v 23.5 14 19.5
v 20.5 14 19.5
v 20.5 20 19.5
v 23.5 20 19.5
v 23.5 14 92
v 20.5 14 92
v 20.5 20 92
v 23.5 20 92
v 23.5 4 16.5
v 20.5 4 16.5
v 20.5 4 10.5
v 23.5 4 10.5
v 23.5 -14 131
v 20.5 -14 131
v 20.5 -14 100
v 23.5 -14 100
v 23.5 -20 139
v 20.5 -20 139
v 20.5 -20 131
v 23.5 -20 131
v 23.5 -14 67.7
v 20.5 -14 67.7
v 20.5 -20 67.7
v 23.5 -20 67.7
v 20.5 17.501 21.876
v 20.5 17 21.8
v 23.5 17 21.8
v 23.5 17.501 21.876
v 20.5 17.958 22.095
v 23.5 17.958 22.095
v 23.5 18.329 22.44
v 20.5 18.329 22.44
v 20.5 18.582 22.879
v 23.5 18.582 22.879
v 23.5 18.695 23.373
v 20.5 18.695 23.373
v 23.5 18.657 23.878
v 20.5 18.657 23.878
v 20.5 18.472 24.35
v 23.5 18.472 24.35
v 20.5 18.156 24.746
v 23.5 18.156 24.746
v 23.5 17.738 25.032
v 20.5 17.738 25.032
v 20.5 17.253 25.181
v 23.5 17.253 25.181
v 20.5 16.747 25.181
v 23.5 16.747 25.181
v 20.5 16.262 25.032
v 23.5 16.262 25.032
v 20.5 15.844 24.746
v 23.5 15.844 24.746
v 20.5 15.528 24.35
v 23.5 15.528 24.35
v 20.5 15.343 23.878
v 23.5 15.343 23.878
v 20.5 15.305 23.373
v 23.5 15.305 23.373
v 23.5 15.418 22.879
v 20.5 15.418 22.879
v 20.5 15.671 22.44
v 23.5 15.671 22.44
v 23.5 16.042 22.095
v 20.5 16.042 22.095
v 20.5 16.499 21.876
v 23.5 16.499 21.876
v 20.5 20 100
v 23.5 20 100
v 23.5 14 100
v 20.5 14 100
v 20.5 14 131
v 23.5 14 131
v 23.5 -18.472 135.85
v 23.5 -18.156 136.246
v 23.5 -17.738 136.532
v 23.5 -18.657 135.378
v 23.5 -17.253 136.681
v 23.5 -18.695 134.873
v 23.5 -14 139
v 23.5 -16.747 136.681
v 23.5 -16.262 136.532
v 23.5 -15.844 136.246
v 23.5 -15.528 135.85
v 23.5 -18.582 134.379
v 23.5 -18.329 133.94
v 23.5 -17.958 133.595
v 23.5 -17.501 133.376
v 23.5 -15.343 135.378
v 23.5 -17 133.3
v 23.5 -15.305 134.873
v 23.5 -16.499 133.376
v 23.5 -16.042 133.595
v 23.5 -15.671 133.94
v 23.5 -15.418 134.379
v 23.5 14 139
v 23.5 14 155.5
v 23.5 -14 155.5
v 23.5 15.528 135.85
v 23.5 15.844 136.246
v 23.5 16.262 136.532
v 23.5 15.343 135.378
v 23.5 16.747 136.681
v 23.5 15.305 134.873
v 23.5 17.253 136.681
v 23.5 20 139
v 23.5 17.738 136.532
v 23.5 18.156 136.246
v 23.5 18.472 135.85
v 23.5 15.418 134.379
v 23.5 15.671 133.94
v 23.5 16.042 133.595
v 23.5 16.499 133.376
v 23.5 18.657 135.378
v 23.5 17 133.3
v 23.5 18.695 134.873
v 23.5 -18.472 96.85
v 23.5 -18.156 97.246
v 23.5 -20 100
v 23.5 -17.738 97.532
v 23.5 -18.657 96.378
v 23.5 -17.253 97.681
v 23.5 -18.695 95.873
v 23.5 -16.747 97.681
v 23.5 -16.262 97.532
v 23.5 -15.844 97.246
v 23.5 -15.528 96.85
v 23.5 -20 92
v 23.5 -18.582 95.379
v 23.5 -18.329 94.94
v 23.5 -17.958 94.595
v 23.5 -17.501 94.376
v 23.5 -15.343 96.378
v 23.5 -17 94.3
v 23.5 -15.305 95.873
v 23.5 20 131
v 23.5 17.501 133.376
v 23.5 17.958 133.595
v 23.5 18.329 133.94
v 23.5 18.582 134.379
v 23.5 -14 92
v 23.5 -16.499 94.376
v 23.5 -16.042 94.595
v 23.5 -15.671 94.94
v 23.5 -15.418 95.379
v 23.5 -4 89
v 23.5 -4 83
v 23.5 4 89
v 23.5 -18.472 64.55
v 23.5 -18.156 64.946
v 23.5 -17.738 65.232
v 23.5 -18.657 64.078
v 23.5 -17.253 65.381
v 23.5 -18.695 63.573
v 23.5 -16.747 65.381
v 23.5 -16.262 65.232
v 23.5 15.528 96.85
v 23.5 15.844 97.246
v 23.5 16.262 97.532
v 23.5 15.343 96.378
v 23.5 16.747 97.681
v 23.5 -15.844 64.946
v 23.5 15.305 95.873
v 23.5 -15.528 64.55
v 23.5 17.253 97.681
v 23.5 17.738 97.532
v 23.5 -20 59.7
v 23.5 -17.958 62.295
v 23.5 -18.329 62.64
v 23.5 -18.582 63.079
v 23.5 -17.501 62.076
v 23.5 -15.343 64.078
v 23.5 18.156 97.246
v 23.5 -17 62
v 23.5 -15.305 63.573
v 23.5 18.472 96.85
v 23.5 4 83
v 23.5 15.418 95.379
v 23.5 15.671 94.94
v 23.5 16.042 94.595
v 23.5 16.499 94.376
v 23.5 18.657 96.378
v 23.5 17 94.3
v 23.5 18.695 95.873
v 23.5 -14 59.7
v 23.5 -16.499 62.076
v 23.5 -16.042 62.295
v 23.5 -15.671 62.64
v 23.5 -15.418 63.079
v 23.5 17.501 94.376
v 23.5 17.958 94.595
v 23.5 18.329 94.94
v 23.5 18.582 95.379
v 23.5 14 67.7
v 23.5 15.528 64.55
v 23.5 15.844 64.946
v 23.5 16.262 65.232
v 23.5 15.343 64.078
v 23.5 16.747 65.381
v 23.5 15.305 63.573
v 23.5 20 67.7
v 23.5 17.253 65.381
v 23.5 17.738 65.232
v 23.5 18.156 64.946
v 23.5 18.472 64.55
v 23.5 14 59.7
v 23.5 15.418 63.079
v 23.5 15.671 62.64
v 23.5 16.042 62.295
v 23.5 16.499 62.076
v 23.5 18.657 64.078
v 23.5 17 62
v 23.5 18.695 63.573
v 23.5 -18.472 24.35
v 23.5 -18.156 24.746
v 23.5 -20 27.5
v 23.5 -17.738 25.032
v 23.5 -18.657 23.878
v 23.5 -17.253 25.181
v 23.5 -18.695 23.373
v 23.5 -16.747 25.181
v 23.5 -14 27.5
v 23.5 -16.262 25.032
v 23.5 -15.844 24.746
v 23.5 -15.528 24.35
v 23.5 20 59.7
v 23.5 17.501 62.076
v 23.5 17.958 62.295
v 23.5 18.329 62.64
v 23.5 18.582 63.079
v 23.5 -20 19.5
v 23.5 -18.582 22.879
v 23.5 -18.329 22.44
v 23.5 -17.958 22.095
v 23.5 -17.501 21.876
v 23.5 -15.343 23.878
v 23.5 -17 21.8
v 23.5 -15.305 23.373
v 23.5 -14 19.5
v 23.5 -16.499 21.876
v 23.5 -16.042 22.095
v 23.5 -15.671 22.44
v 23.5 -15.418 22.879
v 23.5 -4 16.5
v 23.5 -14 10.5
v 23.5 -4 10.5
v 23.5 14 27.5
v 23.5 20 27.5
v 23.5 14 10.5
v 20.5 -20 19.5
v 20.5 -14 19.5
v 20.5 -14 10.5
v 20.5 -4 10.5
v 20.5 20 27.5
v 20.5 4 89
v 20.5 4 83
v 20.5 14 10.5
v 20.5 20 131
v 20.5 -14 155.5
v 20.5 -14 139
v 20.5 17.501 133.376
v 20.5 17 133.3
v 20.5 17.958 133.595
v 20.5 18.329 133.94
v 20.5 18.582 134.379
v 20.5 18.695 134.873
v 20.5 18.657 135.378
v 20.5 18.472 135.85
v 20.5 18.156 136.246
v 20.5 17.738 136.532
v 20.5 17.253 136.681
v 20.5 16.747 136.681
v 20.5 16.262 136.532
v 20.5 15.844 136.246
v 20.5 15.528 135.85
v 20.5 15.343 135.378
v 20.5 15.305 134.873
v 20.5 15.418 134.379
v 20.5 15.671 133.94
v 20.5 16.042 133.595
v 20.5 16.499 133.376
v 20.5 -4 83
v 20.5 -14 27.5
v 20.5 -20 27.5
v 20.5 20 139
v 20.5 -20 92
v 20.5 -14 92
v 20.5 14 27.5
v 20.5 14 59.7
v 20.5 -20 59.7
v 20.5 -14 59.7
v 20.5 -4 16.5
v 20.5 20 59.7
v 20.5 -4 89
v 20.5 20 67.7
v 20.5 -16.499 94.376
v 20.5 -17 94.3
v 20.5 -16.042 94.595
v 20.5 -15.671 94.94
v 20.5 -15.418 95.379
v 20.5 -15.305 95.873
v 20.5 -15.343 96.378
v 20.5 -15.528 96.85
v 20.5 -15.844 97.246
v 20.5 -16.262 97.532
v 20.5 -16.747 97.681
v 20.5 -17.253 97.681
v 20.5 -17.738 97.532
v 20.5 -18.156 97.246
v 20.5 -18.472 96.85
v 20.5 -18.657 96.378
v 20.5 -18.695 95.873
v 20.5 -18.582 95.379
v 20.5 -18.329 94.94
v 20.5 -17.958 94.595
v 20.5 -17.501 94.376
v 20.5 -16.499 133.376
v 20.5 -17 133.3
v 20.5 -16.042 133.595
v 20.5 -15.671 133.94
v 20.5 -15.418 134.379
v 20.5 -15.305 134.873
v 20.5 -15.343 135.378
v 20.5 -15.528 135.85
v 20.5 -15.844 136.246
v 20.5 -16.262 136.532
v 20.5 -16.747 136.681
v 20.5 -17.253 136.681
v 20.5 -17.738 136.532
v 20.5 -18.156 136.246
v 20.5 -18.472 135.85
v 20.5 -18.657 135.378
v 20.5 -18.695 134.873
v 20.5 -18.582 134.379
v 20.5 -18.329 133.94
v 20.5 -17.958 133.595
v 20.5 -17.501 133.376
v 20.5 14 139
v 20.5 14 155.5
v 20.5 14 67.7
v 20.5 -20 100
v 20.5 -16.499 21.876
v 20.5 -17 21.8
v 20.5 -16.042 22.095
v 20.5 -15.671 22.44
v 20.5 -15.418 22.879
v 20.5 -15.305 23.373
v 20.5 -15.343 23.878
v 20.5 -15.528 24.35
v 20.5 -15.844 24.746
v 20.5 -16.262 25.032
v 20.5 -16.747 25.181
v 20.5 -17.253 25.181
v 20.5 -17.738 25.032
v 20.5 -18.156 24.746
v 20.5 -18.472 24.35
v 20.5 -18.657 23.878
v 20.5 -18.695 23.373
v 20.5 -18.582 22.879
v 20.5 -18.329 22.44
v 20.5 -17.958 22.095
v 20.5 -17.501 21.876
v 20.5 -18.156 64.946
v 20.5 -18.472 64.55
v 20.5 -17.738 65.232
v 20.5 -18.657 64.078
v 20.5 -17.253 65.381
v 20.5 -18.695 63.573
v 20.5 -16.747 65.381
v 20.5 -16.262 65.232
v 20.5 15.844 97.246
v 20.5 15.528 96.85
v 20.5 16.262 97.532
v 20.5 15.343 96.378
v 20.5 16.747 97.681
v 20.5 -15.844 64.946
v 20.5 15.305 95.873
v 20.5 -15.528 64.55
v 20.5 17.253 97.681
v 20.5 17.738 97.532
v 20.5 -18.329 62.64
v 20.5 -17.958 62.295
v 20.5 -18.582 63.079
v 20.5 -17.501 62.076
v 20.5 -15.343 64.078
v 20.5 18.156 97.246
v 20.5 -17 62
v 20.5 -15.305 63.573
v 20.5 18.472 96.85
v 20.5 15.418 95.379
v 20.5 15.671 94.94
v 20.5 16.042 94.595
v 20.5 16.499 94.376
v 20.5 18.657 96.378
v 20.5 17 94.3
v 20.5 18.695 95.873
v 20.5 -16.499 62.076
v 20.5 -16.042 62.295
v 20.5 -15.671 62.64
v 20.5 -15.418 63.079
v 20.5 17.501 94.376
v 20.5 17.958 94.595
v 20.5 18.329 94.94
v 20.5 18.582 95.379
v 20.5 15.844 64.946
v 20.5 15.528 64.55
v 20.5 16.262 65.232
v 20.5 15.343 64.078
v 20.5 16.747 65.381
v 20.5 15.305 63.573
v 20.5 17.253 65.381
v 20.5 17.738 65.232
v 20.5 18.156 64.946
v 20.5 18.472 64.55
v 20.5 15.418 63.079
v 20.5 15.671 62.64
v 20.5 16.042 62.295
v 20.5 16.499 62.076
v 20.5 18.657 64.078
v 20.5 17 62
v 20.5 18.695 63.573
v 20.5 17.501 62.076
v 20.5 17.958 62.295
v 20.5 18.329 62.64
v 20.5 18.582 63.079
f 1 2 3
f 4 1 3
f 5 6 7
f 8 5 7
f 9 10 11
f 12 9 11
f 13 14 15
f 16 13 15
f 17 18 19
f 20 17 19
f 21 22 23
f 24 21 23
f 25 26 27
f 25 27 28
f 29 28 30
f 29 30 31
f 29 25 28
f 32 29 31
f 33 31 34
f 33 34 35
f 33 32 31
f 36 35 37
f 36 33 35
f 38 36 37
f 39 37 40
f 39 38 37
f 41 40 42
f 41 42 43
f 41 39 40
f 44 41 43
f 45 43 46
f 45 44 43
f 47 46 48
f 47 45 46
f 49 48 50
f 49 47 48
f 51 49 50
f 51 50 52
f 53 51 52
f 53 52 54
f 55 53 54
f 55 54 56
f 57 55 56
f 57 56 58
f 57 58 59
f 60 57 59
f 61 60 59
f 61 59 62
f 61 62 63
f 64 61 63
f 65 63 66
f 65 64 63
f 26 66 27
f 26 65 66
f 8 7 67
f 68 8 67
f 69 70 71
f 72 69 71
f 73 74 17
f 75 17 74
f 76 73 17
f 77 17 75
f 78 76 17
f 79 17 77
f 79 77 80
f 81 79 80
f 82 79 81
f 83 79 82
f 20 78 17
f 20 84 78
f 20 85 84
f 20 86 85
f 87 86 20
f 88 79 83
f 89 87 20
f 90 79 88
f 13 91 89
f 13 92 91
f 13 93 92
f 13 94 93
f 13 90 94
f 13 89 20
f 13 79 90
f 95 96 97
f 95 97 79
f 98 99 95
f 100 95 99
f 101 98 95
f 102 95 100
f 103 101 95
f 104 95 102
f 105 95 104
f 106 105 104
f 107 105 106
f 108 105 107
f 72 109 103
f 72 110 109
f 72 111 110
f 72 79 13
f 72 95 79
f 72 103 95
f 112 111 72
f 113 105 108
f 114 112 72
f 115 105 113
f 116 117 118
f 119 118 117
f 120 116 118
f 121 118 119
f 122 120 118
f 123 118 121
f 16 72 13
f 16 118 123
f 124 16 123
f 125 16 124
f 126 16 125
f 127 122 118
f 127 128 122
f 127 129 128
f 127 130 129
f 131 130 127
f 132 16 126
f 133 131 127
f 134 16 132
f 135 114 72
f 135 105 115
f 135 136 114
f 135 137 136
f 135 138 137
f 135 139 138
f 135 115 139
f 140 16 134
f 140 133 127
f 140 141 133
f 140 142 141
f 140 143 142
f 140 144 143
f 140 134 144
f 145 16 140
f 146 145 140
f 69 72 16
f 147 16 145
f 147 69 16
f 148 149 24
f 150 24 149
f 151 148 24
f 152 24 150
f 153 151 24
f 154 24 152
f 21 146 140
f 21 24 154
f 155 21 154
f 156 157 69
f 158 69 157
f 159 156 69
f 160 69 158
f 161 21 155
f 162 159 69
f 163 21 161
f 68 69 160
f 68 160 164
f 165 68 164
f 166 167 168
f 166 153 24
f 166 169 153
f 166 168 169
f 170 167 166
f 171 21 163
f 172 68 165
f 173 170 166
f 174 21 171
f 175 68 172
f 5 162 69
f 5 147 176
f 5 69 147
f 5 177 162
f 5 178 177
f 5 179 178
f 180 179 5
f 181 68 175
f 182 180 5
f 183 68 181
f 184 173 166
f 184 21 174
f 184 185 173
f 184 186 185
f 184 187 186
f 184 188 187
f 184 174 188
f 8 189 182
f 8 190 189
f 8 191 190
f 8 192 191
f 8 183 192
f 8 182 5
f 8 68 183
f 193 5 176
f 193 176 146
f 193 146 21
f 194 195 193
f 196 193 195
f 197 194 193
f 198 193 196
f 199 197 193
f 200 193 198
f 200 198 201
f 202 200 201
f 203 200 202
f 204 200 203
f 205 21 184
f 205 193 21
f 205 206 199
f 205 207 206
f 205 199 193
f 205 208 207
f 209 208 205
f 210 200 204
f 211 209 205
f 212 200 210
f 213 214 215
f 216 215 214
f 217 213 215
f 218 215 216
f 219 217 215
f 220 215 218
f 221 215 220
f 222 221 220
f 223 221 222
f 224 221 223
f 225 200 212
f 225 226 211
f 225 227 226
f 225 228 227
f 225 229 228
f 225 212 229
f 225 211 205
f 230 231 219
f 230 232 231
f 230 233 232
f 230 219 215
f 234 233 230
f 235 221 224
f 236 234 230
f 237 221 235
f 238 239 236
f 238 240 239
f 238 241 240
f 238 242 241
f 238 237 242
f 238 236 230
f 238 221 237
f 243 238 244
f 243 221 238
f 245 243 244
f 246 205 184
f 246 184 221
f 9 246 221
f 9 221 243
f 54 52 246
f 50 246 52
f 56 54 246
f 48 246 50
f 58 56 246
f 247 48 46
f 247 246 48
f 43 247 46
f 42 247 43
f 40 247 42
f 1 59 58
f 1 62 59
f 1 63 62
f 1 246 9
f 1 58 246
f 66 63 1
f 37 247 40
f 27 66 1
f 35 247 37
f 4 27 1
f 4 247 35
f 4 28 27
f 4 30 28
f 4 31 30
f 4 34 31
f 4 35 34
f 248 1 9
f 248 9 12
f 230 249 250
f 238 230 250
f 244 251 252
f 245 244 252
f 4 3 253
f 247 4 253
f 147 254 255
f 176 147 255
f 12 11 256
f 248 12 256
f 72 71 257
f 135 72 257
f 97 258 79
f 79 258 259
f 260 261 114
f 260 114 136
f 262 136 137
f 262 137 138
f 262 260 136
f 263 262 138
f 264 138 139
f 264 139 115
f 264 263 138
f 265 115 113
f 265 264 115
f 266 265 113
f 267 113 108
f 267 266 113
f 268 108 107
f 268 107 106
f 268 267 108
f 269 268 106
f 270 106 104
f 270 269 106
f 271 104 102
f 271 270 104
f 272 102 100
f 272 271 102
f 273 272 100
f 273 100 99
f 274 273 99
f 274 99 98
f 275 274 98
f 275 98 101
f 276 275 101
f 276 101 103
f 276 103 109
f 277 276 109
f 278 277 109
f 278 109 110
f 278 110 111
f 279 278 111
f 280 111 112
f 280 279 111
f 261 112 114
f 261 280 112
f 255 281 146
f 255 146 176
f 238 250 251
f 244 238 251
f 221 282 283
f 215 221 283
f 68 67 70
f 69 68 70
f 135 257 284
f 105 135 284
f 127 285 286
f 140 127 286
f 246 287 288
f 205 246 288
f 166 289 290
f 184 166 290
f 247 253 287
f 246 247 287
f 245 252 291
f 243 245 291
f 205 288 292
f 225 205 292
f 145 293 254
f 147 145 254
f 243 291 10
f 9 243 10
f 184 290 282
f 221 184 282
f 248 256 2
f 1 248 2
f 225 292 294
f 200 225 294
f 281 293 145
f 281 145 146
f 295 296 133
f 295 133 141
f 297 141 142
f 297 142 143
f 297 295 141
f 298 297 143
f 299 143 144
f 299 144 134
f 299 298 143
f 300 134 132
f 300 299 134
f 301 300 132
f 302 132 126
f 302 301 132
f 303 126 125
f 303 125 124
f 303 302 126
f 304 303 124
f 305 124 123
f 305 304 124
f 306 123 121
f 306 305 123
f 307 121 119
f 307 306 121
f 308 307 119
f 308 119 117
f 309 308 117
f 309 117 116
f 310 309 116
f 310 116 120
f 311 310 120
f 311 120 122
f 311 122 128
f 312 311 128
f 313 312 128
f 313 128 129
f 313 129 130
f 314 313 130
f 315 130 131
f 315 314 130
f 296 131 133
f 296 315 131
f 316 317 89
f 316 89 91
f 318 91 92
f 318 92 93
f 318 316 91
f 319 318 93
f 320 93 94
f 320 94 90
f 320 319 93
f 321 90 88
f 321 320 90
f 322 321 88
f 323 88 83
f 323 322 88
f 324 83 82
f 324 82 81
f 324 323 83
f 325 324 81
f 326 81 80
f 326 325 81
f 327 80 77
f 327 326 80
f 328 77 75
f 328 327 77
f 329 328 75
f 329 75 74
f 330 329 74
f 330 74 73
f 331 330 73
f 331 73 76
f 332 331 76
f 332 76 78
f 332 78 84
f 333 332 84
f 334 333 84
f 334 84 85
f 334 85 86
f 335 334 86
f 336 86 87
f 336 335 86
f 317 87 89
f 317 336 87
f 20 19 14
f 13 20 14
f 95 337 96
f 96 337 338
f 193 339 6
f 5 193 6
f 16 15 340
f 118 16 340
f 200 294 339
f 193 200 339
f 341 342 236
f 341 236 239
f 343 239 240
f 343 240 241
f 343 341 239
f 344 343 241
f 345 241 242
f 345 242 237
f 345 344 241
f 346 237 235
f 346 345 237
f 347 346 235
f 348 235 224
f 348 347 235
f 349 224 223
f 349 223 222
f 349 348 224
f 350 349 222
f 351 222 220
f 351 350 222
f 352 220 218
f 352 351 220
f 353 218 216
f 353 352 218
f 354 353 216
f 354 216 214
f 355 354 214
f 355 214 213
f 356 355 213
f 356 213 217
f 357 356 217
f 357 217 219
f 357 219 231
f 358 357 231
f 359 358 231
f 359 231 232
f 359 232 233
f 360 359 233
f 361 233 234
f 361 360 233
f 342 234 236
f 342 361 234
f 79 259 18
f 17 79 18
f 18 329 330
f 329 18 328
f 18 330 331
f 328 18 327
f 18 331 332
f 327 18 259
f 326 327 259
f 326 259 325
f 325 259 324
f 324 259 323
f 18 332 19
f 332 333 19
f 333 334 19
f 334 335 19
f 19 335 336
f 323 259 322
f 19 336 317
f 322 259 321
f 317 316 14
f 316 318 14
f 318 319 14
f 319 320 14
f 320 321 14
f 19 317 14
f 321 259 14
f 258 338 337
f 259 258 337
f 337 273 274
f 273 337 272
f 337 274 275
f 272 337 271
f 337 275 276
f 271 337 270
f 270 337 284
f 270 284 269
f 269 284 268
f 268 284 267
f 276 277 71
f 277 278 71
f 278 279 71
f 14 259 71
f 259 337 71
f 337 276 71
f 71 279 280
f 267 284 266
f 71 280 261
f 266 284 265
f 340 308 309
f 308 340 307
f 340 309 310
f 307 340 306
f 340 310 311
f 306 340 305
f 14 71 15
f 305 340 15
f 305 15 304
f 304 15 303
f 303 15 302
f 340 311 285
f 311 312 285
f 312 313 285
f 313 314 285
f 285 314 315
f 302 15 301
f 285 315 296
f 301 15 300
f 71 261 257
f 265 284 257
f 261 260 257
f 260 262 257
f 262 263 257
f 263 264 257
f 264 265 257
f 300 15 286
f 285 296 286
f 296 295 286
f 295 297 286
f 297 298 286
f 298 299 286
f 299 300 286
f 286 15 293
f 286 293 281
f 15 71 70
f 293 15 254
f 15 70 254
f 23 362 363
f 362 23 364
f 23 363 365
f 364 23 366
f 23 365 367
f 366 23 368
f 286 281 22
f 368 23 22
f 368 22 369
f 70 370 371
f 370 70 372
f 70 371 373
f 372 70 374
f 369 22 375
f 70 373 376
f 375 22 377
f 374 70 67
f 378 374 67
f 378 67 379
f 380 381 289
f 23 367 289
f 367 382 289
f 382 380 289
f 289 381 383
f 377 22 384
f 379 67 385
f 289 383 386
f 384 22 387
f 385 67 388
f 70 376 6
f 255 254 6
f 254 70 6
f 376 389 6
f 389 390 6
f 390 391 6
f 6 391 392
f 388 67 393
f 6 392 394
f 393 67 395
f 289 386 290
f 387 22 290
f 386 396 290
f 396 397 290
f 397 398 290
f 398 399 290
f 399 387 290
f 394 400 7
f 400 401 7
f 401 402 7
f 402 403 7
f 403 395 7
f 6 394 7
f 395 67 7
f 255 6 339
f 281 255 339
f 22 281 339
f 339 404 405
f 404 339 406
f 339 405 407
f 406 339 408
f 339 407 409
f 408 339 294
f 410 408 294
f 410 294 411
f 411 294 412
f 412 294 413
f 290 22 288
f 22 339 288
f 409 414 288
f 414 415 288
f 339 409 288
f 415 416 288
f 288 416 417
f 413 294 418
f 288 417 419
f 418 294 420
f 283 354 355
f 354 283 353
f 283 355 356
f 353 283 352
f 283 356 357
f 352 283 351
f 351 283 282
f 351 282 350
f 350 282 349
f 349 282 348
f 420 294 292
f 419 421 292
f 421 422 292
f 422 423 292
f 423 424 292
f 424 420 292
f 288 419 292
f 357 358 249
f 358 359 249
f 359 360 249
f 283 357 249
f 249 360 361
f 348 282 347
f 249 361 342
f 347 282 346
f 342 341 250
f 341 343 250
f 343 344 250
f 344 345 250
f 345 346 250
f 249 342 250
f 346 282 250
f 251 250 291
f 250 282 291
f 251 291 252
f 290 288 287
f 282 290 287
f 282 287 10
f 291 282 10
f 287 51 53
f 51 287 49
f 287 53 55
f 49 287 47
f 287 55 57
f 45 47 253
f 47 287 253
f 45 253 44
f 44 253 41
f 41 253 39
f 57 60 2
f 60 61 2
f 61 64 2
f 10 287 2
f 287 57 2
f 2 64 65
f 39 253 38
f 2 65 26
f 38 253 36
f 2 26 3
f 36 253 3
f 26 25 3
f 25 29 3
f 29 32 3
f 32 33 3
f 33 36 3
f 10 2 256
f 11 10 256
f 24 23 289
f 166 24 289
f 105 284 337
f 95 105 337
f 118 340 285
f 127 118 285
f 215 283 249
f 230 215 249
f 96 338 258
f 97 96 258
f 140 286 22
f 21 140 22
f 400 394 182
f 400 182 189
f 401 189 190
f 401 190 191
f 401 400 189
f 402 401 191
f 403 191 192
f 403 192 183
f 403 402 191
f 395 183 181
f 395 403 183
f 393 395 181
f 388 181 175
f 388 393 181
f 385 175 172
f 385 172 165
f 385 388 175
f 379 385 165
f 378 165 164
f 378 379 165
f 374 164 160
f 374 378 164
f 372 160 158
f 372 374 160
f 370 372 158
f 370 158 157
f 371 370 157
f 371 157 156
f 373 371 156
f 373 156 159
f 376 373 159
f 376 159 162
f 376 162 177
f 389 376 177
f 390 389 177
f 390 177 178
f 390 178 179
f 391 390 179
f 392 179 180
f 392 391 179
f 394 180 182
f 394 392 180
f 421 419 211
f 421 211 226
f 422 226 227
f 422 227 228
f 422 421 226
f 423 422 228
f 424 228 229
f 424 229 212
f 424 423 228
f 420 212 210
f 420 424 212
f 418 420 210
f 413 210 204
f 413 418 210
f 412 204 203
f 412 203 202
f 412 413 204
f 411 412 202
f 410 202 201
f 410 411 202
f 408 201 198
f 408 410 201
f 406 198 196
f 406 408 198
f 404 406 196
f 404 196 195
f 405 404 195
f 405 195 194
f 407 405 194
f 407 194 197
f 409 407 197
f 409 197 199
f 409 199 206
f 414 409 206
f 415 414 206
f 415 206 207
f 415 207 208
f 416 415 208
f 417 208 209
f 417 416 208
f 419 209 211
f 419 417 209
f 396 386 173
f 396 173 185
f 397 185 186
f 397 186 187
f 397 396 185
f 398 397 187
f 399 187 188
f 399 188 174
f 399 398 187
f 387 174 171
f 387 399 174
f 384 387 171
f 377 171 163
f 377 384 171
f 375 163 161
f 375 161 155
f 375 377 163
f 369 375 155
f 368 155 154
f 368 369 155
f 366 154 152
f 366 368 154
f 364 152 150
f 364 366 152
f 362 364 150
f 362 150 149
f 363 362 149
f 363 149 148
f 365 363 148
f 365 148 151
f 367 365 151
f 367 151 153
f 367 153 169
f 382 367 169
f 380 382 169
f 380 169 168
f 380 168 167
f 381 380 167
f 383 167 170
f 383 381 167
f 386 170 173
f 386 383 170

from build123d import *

# Parameters (mm, degrees)
EXTRUDE_START   = 20.5
SKETCH_1_R      = 1.7
SKETCH_1_W      = 6
SKETCH_1_H      = 8
EXTRUDE_1_DEPTH = 3


with BuildPart() as part:
    # 草圖1 → 填料-伸長1 (new body)
    with BuildSketch(Plane(origin=(0, 0, 0), x_dir=(0, 0, -1), z_dir=(1, 0, 0)).offset(EXTRUDE_START)):
        Polygon((-10.5, 14), (-19.5, 14), (-19.5, 20), (-27.5, 20), (-27.5, 14), (-59.7, 14), (-59.7, 20), (-67.7, 20), (-67.7, 14), (-92, 14), (-92, 20), (-100, 20), (-100, 14), (-131, 14), (-131, 20), (-139, 20), (-139, 14), (-155.5, 14), (-155.5, -14), (-139, -14), (-139, -20), (-131, -20), (-131, -14), (-100, -14), (-100, -20), (-92, -20), (-92, -14), (-67.7, -14), (-67.7, -20), (-59.7, -20), (-59.7, -14), (-27.5, -14), (-27.5, -20), (-19.5, -20), (-19.5, -14), (-10.5, -14), (-10.5, -4), (-16.5, -4), (-16.5, 4), (-10.5, 4), align=None)
        with Locations((-23.5, 17)):
            Circle(SKETCH_1_R, mode=Mode.SUBTRACT)
        with Locations((-23.5, -17)):
            Circle(SKETCH_1_R, mode=Mode.SUBTRACT)
        with Locations((-63.7, 17)):
            Circle(SKETCH_1_R, mode=Mode.SUBTRACT)
        with Locations((-63.7, -17)):
            Circle(SKETCH_1_R, mode=Mode.SUBTRACT)
        with Locations((-96, 17)):
            Circle(SKETCH_1_R, mode=Mode.SUBTRACT)
        with Locations((-96, -17)):
            Circle(SKETCH_1_R, mode=Mode.SUBTRACT)
        with Locations((-135, 17)):
            Circle(SKETCH_1_R, mode=Mode.SUBTRACT)
        with Locations((-135, -17)):
            Circle(SKETCH_1_R, mode=Mode.SUBTRACT)
        with Locations((-86, 0)):
            Rectangle(SKETCH_1_W, SKETCH_1_H, mode=Mode.SUBTRACT)
    extrude(amount=EXTRUDE_1_DEPTH)


solid = part.part
